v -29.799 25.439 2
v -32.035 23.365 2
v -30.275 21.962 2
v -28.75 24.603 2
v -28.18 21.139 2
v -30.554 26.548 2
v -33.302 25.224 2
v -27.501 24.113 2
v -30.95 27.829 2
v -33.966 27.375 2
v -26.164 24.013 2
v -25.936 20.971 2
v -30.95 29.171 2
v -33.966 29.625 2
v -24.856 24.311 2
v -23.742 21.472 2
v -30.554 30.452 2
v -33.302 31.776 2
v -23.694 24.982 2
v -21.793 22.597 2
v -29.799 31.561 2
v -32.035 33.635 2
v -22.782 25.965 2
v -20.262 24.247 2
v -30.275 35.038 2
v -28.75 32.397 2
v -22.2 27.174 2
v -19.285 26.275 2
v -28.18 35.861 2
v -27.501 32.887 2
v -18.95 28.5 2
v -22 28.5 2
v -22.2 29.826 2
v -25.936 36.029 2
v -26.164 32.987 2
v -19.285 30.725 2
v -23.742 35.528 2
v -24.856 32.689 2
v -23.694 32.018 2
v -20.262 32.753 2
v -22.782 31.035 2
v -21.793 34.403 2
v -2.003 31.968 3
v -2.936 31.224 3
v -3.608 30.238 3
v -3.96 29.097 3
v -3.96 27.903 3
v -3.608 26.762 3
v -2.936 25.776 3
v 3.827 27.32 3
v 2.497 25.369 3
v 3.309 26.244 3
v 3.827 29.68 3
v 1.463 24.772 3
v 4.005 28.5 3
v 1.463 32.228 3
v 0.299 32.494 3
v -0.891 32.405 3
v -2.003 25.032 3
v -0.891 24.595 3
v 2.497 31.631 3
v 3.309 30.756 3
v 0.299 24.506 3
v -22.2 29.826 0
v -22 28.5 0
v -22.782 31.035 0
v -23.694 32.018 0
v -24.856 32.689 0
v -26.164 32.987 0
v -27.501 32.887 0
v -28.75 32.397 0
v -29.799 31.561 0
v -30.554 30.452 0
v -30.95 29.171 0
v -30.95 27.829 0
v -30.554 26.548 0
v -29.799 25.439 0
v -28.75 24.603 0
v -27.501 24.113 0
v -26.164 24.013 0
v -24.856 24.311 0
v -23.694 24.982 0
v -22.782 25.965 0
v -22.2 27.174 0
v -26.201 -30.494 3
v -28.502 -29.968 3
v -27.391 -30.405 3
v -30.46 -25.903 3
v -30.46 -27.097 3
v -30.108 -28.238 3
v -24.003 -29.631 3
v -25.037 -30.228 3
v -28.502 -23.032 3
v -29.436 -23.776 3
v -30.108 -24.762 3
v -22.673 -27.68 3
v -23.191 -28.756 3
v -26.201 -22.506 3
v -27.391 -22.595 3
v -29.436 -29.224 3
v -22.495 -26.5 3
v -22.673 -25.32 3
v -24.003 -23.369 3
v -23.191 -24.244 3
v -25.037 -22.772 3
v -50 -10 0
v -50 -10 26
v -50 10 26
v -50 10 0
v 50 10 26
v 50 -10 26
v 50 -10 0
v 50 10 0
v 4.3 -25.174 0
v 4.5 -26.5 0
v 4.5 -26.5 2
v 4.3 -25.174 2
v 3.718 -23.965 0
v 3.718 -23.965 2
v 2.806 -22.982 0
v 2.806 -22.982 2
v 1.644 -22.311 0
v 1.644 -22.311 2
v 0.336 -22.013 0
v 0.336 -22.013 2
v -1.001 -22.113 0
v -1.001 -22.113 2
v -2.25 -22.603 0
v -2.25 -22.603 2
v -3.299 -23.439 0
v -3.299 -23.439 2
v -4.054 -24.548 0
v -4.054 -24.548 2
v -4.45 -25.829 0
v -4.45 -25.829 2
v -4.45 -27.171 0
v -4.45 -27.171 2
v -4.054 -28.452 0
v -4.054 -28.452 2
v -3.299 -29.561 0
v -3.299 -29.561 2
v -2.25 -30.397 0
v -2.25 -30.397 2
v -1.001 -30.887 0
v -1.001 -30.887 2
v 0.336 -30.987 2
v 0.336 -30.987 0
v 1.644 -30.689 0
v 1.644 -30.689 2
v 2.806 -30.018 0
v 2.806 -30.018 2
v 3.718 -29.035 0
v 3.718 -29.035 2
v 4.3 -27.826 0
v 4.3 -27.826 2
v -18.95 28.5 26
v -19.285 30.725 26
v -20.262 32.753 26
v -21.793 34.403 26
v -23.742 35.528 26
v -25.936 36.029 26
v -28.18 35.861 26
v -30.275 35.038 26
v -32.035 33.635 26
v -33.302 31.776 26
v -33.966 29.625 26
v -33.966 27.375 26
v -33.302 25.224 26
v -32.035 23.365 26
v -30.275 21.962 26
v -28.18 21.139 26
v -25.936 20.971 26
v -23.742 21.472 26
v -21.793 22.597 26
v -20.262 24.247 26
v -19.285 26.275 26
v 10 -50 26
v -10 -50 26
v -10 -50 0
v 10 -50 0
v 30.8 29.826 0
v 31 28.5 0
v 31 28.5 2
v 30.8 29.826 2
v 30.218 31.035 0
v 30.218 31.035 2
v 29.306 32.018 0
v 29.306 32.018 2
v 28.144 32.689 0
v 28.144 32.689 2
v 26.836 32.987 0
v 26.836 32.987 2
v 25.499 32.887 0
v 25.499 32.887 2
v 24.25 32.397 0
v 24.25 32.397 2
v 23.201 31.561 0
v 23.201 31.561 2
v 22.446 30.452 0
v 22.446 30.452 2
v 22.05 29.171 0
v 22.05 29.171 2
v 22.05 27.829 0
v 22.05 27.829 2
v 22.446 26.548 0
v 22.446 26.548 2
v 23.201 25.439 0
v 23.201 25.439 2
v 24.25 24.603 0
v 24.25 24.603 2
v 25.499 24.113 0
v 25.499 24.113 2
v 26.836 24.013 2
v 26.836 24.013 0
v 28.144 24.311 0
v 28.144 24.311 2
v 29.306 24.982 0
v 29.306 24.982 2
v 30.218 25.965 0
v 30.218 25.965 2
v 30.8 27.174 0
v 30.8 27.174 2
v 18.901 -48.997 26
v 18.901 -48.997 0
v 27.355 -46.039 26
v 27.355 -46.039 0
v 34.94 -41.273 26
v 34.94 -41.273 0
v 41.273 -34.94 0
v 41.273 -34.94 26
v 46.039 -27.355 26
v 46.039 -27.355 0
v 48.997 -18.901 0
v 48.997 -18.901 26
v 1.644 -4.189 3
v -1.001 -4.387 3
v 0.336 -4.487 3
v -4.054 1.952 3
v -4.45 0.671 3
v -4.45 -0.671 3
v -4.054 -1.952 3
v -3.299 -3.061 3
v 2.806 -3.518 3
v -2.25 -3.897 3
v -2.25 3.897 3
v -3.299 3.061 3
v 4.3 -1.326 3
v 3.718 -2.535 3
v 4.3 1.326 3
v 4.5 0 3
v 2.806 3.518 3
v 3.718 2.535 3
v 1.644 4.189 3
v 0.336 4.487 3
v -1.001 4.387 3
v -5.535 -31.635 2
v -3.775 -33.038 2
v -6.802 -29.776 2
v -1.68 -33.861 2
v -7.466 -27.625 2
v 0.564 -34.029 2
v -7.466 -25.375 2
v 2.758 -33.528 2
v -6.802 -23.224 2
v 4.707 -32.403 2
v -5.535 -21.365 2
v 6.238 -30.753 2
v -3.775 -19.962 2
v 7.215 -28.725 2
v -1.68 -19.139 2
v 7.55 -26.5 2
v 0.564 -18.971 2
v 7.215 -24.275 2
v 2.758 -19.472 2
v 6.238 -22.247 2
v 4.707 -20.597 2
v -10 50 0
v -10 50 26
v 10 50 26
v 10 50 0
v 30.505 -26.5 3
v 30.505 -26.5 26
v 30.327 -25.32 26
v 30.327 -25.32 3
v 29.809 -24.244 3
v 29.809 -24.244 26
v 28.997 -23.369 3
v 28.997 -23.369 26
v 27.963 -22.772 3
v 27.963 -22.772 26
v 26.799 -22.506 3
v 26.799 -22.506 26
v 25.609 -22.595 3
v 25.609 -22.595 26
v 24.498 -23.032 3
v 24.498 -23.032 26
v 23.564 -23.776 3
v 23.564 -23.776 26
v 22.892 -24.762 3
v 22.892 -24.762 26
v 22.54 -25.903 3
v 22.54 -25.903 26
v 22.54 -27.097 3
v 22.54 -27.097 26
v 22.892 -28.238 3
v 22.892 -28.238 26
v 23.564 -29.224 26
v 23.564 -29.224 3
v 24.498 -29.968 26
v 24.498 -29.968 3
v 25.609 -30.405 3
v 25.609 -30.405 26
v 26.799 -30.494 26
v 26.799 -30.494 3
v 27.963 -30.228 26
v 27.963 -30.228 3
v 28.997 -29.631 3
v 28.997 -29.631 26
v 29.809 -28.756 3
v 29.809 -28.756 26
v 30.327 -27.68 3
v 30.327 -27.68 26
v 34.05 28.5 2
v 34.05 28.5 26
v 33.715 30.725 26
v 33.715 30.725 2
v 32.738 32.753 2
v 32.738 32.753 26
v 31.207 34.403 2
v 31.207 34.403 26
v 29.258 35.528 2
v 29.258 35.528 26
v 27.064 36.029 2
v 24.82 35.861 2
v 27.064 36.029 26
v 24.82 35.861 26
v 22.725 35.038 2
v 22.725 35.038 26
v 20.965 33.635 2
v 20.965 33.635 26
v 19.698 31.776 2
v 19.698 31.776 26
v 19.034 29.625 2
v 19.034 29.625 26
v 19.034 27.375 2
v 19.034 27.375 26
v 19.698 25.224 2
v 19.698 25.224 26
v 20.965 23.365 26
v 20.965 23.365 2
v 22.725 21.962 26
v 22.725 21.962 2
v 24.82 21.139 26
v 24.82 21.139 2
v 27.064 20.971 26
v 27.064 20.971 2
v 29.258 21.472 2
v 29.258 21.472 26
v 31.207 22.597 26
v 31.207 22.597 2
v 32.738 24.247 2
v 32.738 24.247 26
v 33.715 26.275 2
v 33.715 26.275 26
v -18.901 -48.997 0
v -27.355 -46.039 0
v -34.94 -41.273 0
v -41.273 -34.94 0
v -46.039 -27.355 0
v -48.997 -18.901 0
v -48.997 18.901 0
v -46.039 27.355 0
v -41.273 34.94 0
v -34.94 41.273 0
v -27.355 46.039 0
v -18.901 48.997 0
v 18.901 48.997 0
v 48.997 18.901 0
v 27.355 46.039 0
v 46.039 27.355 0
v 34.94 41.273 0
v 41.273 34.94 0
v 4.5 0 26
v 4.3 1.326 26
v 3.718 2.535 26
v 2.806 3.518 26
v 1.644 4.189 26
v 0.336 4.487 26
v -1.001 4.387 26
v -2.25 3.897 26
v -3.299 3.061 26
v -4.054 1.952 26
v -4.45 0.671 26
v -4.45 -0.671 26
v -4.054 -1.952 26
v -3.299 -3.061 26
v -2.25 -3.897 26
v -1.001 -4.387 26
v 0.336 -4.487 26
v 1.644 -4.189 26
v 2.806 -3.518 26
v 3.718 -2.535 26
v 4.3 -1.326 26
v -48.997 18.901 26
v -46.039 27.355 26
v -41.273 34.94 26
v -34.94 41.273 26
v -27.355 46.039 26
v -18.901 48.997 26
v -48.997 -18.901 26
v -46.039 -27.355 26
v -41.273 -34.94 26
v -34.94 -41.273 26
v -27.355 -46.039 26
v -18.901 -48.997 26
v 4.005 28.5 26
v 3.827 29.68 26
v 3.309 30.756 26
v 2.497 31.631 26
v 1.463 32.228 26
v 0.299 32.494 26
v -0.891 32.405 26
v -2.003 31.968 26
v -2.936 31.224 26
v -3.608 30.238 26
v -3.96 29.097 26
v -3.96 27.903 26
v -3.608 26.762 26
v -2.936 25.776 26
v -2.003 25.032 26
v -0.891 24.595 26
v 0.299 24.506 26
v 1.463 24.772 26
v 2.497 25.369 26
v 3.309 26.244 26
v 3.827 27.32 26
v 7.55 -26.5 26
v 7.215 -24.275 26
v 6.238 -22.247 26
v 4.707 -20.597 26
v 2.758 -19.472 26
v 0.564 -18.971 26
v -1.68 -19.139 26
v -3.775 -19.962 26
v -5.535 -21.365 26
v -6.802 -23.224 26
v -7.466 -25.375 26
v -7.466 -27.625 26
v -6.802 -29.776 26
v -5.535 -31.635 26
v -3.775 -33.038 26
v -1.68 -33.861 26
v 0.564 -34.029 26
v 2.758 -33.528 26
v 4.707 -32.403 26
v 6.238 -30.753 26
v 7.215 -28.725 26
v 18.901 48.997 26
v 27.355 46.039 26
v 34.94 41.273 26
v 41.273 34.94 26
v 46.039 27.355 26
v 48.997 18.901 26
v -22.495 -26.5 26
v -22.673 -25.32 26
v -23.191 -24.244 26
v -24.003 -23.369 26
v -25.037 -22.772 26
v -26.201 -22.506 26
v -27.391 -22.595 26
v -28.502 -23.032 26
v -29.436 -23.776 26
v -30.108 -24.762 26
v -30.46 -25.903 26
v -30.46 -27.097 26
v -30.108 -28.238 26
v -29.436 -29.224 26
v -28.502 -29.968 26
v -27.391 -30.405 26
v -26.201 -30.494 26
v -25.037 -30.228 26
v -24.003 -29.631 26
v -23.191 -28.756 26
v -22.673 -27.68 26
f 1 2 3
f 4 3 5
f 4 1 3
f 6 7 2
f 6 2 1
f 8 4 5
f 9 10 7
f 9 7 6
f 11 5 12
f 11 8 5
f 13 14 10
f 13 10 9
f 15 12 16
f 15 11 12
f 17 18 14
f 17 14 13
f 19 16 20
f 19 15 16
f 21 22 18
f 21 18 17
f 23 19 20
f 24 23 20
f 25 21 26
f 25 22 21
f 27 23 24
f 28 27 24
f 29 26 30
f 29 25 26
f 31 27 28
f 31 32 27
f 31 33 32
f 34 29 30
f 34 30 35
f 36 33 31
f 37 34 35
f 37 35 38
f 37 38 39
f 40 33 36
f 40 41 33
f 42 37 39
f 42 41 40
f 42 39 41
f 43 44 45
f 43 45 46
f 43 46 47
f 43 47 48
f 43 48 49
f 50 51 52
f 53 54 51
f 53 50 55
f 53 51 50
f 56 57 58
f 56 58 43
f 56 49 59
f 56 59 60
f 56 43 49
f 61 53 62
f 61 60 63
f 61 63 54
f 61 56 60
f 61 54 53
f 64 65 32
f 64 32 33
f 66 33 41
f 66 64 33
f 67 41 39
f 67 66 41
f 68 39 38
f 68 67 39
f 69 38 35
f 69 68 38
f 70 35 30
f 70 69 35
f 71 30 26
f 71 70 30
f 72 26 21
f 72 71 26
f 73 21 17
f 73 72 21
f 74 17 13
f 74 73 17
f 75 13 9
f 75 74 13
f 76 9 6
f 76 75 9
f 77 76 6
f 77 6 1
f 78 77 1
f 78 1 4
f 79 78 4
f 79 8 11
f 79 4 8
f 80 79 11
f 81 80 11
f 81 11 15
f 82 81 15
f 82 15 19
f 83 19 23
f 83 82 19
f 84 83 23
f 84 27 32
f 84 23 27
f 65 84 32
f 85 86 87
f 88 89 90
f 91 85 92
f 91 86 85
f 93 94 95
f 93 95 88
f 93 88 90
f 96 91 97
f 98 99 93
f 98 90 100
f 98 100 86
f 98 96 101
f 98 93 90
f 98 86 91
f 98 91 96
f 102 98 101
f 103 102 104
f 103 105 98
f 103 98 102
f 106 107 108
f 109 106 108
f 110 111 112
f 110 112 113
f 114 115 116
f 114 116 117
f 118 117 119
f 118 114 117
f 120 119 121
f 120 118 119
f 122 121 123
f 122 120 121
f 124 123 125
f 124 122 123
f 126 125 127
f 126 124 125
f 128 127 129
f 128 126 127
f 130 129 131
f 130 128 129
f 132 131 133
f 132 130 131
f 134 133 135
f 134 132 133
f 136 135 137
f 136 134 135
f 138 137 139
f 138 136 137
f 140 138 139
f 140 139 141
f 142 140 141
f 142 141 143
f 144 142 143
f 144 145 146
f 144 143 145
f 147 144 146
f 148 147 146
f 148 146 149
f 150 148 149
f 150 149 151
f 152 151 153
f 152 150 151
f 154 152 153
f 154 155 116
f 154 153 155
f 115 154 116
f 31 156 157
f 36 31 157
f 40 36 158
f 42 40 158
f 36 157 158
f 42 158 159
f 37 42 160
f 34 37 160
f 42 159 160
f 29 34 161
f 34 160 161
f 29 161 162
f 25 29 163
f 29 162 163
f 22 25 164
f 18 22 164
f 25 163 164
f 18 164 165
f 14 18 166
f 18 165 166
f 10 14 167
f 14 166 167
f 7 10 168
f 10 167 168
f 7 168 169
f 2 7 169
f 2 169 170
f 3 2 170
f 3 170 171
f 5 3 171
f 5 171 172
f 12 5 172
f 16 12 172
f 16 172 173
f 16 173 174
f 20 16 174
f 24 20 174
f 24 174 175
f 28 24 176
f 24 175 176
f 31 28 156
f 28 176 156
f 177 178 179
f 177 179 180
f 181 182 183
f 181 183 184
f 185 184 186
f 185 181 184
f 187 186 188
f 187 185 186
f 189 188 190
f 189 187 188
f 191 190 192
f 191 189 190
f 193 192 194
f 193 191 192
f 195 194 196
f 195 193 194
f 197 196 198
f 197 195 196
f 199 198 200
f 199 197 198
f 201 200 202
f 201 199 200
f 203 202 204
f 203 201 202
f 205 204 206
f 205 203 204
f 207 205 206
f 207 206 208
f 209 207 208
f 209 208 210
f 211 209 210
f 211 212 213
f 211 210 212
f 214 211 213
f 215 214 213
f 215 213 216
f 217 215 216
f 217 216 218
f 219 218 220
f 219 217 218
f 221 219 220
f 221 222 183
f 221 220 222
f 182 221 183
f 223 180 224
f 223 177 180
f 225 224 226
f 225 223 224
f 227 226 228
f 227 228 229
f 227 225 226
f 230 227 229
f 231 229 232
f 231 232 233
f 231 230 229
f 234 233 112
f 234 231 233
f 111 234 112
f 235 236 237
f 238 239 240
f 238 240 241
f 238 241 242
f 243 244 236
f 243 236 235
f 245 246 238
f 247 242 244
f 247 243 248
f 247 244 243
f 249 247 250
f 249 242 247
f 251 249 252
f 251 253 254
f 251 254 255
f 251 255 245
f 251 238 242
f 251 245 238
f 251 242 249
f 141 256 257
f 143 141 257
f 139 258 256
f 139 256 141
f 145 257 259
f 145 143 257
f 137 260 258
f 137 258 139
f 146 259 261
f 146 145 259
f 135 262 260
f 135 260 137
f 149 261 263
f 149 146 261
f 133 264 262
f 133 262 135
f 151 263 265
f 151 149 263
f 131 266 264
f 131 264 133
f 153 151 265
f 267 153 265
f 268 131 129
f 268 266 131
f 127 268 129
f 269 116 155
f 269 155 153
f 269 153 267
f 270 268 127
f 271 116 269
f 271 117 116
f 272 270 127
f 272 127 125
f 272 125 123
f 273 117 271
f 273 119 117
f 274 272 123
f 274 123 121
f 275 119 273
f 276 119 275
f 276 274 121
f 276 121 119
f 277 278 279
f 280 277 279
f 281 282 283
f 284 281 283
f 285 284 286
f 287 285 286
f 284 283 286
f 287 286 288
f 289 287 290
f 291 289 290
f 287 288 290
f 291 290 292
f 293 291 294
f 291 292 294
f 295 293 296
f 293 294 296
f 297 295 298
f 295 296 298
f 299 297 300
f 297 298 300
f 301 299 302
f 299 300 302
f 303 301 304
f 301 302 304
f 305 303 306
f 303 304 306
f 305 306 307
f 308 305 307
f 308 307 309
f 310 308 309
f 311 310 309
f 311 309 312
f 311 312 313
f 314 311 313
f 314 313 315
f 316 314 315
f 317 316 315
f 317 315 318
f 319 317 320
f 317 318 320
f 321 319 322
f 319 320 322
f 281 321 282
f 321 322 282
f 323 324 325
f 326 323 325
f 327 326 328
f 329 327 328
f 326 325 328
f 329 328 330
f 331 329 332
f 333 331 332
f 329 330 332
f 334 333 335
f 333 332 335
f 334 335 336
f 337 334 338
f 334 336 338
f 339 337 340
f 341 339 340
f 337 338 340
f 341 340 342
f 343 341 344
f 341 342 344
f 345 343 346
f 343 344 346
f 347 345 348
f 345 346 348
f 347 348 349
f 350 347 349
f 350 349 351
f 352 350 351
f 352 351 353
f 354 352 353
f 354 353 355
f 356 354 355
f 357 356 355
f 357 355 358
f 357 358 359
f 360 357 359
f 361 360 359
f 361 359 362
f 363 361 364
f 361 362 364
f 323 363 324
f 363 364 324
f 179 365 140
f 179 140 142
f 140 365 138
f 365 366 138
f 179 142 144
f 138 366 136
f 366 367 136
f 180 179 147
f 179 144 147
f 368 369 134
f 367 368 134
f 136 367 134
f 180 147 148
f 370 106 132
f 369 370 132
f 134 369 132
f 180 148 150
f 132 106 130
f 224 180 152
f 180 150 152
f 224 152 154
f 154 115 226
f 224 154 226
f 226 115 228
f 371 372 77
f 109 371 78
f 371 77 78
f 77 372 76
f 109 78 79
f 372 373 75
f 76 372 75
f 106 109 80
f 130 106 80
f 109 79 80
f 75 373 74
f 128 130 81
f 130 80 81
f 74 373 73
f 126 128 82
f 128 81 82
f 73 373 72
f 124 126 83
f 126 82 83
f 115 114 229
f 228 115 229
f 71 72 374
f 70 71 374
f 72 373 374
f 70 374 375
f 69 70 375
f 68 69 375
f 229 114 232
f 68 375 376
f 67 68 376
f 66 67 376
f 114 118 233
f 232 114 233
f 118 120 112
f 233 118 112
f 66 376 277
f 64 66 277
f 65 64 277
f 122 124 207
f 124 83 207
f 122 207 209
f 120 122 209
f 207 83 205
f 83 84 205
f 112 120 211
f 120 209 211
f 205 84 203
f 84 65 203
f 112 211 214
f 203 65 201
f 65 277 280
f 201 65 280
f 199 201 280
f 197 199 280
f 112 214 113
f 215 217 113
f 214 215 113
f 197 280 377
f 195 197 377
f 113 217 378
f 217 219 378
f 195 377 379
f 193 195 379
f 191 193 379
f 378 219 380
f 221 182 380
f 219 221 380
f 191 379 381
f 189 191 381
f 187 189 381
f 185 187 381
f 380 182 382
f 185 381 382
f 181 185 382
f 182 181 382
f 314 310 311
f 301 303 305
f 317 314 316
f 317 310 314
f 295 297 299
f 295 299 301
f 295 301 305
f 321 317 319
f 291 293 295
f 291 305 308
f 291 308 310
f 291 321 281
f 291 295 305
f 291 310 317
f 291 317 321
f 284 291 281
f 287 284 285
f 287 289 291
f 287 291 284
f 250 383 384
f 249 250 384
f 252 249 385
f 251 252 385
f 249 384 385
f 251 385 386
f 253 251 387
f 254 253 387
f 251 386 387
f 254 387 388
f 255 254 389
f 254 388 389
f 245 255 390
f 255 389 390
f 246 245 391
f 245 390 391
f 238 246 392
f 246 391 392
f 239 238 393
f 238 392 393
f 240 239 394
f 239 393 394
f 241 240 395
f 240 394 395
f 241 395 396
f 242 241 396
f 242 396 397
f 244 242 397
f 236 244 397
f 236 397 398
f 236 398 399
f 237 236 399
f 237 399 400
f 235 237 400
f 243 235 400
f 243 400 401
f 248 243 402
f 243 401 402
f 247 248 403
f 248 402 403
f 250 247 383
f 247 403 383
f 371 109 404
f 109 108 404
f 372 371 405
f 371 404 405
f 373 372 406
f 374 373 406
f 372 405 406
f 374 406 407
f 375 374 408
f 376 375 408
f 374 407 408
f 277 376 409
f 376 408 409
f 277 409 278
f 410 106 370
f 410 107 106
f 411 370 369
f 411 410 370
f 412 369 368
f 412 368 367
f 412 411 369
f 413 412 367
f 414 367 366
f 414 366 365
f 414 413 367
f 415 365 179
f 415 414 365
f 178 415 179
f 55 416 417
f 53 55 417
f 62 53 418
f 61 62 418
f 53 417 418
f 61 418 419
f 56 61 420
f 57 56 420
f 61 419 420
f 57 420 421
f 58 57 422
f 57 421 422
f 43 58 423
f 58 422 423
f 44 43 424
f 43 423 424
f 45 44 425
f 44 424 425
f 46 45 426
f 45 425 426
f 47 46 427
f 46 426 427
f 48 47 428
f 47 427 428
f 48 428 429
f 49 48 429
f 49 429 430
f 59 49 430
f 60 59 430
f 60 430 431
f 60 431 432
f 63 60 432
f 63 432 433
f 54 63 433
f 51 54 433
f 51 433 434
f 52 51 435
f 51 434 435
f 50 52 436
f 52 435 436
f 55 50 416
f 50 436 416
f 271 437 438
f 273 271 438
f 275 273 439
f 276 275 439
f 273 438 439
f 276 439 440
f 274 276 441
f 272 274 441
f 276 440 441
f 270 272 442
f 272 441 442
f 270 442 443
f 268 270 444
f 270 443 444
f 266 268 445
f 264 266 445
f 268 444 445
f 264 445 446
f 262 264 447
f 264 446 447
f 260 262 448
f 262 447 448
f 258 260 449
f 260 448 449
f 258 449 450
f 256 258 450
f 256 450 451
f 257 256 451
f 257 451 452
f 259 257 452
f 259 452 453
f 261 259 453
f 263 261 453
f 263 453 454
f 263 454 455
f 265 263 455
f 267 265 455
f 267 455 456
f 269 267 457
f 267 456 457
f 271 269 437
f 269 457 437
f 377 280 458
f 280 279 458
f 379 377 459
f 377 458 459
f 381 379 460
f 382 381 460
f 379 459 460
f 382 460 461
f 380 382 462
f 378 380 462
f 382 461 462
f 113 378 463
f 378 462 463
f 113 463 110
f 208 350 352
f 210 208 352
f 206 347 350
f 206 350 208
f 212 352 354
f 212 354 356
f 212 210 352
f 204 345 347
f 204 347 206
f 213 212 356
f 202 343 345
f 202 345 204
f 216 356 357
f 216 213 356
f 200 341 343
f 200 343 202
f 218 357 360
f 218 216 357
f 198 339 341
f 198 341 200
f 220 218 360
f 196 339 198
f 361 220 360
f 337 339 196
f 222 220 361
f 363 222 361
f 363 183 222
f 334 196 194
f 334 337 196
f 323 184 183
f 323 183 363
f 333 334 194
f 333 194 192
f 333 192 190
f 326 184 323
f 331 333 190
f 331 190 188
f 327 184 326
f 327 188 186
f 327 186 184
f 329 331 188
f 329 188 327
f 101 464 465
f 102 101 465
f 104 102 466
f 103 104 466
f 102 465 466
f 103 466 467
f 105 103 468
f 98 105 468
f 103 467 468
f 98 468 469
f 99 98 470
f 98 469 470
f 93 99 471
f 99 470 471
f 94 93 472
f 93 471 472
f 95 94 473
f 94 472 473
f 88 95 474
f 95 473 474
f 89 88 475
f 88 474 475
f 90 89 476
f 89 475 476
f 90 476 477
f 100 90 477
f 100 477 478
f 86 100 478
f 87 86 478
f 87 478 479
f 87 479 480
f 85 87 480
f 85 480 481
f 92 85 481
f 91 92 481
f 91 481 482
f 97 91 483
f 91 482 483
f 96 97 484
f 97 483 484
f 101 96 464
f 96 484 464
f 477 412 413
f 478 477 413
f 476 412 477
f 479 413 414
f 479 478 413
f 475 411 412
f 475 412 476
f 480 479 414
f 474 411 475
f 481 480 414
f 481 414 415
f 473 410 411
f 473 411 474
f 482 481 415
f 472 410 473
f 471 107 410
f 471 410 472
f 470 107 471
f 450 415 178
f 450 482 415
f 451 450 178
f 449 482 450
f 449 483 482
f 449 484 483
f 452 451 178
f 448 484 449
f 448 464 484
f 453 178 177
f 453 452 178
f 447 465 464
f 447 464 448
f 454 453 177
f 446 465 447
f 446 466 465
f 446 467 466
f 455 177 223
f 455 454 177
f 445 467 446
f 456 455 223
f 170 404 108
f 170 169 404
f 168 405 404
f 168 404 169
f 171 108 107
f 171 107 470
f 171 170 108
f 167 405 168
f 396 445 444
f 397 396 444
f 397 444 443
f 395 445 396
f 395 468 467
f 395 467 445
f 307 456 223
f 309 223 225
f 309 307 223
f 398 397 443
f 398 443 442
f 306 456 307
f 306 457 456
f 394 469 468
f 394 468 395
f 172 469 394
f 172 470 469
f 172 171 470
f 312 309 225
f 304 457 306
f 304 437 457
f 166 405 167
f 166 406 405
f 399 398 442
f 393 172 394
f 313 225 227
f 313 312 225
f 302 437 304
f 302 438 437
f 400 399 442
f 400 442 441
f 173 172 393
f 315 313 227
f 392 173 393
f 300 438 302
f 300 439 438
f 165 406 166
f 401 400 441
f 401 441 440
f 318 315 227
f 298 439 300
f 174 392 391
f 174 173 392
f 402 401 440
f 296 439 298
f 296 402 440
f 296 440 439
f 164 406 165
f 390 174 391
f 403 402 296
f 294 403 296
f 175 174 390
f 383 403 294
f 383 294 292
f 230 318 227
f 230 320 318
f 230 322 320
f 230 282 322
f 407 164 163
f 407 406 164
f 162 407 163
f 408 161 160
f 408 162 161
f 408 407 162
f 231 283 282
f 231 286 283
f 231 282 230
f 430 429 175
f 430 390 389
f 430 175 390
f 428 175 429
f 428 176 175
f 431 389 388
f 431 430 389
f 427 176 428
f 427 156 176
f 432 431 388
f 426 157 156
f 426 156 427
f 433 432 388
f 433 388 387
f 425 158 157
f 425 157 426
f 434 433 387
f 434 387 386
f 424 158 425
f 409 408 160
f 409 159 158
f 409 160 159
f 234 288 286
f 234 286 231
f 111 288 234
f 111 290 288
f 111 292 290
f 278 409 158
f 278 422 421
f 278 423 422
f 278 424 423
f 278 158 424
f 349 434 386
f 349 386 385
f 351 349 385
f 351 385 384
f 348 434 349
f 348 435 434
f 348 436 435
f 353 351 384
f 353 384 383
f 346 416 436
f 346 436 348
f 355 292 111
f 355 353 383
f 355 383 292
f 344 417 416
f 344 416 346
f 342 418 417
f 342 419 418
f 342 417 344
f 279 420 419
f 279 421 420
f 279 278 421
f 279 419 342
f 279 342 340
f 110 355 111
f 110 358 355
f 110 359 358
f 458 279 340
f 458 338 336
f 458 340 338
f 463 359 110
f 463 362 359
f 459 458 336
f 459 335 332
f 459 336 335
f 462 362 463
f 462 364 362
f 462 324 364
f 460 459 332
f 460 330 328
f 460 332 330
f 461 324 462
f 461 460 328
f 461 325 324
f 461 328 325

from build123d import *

# Parameters (mm, degrees)
SKETCH1_W               = 100
SKETCH1_H               = 100
BOSS_EXTRUDE1_DEPTH     = 26
SKETCH2_R               = 4.005
SKETCH2_R_2             = 4.5
CUT_EXTRUDE1_DEPTH      = 23
SKETCH4_R               = 7.55
CUT_EXTRUDE2_DEPTH      = 24
CUT_EXTRUDE3_DEPTH      = 76.339232807
CUT_EXTRUDE3_DEPTH_BACK = 76.339232807
SKETCH5_R               = 4.5
FILLET1_R               = 40


with BuildPart() as part:
    # Sketch1 → Boss-Extrude1 (new body)
    with BuildSketch(Plane.XY):
        Rectangle(SKETCH1_W, SKETCH1_H)
    extrude(amount=BOSS_EXTRUDE1_DEPTH)

    # Sketch2 → Cut-Extrude1 (cut)
    with BuildSketch(Plane.XY.offset(26)):
        with Locations((0, 28.499999998)):
            Circle(SKETCH2_R)
        with Locations((-26.5, -26.500000001)):
            Circle(SKETCH2_R)
        with Locations((26.5, -26.500000001)):
            Circle(SKETCH2_R)
        Circle(SKETCH2_R_2)
    extrude(amount=-CUT_EXTRUDE1_DEPTH, mode=Mode.SUBTRACT)

    # Sketch4 → Cut-Extrude2 (cut)
    with BuildSketch(Plane.XY.offset(26)):
        with Locations((-26.5, 28.499999998)):
            Circle(SKETCH4_R)
        with Locations((26.5, 28.499999998)):
            Circle(SKETCH4_R)
        with Locations((0, -26.500000002)):
            Circle(SKETCH4_R)
    extrude(amount=-CUT_EXTRUDE2_DEPTH, mode=Mode.SUBTRACT)

    # Sketch5 → Cut-Extrude3 (cut, two sides: drawn at the far end of the back side and taken through both)
    with BuildSketch(Plane.XY.offset(26).offset(-CUT_EXTRUDE3_DEPTH_BACK)):
        with Locations((-26.5, 28.499999998)):
            Circle(SKETCH5_R)
        with Locations((26.5, 28.499999998)):
            Circle(SKETCH5_R)
        with Locations((0, -26.500000002)):
            Circle(SKETCH5_R)
    extrude(amount=CUT_EXTRUDE3_DEPTH + CUT_EXTRUDE3_DEPTH_BACK, mode=Mode.SUBTRACT)

    # Fillet1
    fillet1_edges = [part.edges().sort_by_distance(p)[0] for p in [
        (50, -50, 13),
        (-50, -50, 13),
        (-50, 50, 13),
        (50, 50, 13),
    ]]
    fillet(fillet1_edges, radius=FILLET1_R)


solid = part.part
